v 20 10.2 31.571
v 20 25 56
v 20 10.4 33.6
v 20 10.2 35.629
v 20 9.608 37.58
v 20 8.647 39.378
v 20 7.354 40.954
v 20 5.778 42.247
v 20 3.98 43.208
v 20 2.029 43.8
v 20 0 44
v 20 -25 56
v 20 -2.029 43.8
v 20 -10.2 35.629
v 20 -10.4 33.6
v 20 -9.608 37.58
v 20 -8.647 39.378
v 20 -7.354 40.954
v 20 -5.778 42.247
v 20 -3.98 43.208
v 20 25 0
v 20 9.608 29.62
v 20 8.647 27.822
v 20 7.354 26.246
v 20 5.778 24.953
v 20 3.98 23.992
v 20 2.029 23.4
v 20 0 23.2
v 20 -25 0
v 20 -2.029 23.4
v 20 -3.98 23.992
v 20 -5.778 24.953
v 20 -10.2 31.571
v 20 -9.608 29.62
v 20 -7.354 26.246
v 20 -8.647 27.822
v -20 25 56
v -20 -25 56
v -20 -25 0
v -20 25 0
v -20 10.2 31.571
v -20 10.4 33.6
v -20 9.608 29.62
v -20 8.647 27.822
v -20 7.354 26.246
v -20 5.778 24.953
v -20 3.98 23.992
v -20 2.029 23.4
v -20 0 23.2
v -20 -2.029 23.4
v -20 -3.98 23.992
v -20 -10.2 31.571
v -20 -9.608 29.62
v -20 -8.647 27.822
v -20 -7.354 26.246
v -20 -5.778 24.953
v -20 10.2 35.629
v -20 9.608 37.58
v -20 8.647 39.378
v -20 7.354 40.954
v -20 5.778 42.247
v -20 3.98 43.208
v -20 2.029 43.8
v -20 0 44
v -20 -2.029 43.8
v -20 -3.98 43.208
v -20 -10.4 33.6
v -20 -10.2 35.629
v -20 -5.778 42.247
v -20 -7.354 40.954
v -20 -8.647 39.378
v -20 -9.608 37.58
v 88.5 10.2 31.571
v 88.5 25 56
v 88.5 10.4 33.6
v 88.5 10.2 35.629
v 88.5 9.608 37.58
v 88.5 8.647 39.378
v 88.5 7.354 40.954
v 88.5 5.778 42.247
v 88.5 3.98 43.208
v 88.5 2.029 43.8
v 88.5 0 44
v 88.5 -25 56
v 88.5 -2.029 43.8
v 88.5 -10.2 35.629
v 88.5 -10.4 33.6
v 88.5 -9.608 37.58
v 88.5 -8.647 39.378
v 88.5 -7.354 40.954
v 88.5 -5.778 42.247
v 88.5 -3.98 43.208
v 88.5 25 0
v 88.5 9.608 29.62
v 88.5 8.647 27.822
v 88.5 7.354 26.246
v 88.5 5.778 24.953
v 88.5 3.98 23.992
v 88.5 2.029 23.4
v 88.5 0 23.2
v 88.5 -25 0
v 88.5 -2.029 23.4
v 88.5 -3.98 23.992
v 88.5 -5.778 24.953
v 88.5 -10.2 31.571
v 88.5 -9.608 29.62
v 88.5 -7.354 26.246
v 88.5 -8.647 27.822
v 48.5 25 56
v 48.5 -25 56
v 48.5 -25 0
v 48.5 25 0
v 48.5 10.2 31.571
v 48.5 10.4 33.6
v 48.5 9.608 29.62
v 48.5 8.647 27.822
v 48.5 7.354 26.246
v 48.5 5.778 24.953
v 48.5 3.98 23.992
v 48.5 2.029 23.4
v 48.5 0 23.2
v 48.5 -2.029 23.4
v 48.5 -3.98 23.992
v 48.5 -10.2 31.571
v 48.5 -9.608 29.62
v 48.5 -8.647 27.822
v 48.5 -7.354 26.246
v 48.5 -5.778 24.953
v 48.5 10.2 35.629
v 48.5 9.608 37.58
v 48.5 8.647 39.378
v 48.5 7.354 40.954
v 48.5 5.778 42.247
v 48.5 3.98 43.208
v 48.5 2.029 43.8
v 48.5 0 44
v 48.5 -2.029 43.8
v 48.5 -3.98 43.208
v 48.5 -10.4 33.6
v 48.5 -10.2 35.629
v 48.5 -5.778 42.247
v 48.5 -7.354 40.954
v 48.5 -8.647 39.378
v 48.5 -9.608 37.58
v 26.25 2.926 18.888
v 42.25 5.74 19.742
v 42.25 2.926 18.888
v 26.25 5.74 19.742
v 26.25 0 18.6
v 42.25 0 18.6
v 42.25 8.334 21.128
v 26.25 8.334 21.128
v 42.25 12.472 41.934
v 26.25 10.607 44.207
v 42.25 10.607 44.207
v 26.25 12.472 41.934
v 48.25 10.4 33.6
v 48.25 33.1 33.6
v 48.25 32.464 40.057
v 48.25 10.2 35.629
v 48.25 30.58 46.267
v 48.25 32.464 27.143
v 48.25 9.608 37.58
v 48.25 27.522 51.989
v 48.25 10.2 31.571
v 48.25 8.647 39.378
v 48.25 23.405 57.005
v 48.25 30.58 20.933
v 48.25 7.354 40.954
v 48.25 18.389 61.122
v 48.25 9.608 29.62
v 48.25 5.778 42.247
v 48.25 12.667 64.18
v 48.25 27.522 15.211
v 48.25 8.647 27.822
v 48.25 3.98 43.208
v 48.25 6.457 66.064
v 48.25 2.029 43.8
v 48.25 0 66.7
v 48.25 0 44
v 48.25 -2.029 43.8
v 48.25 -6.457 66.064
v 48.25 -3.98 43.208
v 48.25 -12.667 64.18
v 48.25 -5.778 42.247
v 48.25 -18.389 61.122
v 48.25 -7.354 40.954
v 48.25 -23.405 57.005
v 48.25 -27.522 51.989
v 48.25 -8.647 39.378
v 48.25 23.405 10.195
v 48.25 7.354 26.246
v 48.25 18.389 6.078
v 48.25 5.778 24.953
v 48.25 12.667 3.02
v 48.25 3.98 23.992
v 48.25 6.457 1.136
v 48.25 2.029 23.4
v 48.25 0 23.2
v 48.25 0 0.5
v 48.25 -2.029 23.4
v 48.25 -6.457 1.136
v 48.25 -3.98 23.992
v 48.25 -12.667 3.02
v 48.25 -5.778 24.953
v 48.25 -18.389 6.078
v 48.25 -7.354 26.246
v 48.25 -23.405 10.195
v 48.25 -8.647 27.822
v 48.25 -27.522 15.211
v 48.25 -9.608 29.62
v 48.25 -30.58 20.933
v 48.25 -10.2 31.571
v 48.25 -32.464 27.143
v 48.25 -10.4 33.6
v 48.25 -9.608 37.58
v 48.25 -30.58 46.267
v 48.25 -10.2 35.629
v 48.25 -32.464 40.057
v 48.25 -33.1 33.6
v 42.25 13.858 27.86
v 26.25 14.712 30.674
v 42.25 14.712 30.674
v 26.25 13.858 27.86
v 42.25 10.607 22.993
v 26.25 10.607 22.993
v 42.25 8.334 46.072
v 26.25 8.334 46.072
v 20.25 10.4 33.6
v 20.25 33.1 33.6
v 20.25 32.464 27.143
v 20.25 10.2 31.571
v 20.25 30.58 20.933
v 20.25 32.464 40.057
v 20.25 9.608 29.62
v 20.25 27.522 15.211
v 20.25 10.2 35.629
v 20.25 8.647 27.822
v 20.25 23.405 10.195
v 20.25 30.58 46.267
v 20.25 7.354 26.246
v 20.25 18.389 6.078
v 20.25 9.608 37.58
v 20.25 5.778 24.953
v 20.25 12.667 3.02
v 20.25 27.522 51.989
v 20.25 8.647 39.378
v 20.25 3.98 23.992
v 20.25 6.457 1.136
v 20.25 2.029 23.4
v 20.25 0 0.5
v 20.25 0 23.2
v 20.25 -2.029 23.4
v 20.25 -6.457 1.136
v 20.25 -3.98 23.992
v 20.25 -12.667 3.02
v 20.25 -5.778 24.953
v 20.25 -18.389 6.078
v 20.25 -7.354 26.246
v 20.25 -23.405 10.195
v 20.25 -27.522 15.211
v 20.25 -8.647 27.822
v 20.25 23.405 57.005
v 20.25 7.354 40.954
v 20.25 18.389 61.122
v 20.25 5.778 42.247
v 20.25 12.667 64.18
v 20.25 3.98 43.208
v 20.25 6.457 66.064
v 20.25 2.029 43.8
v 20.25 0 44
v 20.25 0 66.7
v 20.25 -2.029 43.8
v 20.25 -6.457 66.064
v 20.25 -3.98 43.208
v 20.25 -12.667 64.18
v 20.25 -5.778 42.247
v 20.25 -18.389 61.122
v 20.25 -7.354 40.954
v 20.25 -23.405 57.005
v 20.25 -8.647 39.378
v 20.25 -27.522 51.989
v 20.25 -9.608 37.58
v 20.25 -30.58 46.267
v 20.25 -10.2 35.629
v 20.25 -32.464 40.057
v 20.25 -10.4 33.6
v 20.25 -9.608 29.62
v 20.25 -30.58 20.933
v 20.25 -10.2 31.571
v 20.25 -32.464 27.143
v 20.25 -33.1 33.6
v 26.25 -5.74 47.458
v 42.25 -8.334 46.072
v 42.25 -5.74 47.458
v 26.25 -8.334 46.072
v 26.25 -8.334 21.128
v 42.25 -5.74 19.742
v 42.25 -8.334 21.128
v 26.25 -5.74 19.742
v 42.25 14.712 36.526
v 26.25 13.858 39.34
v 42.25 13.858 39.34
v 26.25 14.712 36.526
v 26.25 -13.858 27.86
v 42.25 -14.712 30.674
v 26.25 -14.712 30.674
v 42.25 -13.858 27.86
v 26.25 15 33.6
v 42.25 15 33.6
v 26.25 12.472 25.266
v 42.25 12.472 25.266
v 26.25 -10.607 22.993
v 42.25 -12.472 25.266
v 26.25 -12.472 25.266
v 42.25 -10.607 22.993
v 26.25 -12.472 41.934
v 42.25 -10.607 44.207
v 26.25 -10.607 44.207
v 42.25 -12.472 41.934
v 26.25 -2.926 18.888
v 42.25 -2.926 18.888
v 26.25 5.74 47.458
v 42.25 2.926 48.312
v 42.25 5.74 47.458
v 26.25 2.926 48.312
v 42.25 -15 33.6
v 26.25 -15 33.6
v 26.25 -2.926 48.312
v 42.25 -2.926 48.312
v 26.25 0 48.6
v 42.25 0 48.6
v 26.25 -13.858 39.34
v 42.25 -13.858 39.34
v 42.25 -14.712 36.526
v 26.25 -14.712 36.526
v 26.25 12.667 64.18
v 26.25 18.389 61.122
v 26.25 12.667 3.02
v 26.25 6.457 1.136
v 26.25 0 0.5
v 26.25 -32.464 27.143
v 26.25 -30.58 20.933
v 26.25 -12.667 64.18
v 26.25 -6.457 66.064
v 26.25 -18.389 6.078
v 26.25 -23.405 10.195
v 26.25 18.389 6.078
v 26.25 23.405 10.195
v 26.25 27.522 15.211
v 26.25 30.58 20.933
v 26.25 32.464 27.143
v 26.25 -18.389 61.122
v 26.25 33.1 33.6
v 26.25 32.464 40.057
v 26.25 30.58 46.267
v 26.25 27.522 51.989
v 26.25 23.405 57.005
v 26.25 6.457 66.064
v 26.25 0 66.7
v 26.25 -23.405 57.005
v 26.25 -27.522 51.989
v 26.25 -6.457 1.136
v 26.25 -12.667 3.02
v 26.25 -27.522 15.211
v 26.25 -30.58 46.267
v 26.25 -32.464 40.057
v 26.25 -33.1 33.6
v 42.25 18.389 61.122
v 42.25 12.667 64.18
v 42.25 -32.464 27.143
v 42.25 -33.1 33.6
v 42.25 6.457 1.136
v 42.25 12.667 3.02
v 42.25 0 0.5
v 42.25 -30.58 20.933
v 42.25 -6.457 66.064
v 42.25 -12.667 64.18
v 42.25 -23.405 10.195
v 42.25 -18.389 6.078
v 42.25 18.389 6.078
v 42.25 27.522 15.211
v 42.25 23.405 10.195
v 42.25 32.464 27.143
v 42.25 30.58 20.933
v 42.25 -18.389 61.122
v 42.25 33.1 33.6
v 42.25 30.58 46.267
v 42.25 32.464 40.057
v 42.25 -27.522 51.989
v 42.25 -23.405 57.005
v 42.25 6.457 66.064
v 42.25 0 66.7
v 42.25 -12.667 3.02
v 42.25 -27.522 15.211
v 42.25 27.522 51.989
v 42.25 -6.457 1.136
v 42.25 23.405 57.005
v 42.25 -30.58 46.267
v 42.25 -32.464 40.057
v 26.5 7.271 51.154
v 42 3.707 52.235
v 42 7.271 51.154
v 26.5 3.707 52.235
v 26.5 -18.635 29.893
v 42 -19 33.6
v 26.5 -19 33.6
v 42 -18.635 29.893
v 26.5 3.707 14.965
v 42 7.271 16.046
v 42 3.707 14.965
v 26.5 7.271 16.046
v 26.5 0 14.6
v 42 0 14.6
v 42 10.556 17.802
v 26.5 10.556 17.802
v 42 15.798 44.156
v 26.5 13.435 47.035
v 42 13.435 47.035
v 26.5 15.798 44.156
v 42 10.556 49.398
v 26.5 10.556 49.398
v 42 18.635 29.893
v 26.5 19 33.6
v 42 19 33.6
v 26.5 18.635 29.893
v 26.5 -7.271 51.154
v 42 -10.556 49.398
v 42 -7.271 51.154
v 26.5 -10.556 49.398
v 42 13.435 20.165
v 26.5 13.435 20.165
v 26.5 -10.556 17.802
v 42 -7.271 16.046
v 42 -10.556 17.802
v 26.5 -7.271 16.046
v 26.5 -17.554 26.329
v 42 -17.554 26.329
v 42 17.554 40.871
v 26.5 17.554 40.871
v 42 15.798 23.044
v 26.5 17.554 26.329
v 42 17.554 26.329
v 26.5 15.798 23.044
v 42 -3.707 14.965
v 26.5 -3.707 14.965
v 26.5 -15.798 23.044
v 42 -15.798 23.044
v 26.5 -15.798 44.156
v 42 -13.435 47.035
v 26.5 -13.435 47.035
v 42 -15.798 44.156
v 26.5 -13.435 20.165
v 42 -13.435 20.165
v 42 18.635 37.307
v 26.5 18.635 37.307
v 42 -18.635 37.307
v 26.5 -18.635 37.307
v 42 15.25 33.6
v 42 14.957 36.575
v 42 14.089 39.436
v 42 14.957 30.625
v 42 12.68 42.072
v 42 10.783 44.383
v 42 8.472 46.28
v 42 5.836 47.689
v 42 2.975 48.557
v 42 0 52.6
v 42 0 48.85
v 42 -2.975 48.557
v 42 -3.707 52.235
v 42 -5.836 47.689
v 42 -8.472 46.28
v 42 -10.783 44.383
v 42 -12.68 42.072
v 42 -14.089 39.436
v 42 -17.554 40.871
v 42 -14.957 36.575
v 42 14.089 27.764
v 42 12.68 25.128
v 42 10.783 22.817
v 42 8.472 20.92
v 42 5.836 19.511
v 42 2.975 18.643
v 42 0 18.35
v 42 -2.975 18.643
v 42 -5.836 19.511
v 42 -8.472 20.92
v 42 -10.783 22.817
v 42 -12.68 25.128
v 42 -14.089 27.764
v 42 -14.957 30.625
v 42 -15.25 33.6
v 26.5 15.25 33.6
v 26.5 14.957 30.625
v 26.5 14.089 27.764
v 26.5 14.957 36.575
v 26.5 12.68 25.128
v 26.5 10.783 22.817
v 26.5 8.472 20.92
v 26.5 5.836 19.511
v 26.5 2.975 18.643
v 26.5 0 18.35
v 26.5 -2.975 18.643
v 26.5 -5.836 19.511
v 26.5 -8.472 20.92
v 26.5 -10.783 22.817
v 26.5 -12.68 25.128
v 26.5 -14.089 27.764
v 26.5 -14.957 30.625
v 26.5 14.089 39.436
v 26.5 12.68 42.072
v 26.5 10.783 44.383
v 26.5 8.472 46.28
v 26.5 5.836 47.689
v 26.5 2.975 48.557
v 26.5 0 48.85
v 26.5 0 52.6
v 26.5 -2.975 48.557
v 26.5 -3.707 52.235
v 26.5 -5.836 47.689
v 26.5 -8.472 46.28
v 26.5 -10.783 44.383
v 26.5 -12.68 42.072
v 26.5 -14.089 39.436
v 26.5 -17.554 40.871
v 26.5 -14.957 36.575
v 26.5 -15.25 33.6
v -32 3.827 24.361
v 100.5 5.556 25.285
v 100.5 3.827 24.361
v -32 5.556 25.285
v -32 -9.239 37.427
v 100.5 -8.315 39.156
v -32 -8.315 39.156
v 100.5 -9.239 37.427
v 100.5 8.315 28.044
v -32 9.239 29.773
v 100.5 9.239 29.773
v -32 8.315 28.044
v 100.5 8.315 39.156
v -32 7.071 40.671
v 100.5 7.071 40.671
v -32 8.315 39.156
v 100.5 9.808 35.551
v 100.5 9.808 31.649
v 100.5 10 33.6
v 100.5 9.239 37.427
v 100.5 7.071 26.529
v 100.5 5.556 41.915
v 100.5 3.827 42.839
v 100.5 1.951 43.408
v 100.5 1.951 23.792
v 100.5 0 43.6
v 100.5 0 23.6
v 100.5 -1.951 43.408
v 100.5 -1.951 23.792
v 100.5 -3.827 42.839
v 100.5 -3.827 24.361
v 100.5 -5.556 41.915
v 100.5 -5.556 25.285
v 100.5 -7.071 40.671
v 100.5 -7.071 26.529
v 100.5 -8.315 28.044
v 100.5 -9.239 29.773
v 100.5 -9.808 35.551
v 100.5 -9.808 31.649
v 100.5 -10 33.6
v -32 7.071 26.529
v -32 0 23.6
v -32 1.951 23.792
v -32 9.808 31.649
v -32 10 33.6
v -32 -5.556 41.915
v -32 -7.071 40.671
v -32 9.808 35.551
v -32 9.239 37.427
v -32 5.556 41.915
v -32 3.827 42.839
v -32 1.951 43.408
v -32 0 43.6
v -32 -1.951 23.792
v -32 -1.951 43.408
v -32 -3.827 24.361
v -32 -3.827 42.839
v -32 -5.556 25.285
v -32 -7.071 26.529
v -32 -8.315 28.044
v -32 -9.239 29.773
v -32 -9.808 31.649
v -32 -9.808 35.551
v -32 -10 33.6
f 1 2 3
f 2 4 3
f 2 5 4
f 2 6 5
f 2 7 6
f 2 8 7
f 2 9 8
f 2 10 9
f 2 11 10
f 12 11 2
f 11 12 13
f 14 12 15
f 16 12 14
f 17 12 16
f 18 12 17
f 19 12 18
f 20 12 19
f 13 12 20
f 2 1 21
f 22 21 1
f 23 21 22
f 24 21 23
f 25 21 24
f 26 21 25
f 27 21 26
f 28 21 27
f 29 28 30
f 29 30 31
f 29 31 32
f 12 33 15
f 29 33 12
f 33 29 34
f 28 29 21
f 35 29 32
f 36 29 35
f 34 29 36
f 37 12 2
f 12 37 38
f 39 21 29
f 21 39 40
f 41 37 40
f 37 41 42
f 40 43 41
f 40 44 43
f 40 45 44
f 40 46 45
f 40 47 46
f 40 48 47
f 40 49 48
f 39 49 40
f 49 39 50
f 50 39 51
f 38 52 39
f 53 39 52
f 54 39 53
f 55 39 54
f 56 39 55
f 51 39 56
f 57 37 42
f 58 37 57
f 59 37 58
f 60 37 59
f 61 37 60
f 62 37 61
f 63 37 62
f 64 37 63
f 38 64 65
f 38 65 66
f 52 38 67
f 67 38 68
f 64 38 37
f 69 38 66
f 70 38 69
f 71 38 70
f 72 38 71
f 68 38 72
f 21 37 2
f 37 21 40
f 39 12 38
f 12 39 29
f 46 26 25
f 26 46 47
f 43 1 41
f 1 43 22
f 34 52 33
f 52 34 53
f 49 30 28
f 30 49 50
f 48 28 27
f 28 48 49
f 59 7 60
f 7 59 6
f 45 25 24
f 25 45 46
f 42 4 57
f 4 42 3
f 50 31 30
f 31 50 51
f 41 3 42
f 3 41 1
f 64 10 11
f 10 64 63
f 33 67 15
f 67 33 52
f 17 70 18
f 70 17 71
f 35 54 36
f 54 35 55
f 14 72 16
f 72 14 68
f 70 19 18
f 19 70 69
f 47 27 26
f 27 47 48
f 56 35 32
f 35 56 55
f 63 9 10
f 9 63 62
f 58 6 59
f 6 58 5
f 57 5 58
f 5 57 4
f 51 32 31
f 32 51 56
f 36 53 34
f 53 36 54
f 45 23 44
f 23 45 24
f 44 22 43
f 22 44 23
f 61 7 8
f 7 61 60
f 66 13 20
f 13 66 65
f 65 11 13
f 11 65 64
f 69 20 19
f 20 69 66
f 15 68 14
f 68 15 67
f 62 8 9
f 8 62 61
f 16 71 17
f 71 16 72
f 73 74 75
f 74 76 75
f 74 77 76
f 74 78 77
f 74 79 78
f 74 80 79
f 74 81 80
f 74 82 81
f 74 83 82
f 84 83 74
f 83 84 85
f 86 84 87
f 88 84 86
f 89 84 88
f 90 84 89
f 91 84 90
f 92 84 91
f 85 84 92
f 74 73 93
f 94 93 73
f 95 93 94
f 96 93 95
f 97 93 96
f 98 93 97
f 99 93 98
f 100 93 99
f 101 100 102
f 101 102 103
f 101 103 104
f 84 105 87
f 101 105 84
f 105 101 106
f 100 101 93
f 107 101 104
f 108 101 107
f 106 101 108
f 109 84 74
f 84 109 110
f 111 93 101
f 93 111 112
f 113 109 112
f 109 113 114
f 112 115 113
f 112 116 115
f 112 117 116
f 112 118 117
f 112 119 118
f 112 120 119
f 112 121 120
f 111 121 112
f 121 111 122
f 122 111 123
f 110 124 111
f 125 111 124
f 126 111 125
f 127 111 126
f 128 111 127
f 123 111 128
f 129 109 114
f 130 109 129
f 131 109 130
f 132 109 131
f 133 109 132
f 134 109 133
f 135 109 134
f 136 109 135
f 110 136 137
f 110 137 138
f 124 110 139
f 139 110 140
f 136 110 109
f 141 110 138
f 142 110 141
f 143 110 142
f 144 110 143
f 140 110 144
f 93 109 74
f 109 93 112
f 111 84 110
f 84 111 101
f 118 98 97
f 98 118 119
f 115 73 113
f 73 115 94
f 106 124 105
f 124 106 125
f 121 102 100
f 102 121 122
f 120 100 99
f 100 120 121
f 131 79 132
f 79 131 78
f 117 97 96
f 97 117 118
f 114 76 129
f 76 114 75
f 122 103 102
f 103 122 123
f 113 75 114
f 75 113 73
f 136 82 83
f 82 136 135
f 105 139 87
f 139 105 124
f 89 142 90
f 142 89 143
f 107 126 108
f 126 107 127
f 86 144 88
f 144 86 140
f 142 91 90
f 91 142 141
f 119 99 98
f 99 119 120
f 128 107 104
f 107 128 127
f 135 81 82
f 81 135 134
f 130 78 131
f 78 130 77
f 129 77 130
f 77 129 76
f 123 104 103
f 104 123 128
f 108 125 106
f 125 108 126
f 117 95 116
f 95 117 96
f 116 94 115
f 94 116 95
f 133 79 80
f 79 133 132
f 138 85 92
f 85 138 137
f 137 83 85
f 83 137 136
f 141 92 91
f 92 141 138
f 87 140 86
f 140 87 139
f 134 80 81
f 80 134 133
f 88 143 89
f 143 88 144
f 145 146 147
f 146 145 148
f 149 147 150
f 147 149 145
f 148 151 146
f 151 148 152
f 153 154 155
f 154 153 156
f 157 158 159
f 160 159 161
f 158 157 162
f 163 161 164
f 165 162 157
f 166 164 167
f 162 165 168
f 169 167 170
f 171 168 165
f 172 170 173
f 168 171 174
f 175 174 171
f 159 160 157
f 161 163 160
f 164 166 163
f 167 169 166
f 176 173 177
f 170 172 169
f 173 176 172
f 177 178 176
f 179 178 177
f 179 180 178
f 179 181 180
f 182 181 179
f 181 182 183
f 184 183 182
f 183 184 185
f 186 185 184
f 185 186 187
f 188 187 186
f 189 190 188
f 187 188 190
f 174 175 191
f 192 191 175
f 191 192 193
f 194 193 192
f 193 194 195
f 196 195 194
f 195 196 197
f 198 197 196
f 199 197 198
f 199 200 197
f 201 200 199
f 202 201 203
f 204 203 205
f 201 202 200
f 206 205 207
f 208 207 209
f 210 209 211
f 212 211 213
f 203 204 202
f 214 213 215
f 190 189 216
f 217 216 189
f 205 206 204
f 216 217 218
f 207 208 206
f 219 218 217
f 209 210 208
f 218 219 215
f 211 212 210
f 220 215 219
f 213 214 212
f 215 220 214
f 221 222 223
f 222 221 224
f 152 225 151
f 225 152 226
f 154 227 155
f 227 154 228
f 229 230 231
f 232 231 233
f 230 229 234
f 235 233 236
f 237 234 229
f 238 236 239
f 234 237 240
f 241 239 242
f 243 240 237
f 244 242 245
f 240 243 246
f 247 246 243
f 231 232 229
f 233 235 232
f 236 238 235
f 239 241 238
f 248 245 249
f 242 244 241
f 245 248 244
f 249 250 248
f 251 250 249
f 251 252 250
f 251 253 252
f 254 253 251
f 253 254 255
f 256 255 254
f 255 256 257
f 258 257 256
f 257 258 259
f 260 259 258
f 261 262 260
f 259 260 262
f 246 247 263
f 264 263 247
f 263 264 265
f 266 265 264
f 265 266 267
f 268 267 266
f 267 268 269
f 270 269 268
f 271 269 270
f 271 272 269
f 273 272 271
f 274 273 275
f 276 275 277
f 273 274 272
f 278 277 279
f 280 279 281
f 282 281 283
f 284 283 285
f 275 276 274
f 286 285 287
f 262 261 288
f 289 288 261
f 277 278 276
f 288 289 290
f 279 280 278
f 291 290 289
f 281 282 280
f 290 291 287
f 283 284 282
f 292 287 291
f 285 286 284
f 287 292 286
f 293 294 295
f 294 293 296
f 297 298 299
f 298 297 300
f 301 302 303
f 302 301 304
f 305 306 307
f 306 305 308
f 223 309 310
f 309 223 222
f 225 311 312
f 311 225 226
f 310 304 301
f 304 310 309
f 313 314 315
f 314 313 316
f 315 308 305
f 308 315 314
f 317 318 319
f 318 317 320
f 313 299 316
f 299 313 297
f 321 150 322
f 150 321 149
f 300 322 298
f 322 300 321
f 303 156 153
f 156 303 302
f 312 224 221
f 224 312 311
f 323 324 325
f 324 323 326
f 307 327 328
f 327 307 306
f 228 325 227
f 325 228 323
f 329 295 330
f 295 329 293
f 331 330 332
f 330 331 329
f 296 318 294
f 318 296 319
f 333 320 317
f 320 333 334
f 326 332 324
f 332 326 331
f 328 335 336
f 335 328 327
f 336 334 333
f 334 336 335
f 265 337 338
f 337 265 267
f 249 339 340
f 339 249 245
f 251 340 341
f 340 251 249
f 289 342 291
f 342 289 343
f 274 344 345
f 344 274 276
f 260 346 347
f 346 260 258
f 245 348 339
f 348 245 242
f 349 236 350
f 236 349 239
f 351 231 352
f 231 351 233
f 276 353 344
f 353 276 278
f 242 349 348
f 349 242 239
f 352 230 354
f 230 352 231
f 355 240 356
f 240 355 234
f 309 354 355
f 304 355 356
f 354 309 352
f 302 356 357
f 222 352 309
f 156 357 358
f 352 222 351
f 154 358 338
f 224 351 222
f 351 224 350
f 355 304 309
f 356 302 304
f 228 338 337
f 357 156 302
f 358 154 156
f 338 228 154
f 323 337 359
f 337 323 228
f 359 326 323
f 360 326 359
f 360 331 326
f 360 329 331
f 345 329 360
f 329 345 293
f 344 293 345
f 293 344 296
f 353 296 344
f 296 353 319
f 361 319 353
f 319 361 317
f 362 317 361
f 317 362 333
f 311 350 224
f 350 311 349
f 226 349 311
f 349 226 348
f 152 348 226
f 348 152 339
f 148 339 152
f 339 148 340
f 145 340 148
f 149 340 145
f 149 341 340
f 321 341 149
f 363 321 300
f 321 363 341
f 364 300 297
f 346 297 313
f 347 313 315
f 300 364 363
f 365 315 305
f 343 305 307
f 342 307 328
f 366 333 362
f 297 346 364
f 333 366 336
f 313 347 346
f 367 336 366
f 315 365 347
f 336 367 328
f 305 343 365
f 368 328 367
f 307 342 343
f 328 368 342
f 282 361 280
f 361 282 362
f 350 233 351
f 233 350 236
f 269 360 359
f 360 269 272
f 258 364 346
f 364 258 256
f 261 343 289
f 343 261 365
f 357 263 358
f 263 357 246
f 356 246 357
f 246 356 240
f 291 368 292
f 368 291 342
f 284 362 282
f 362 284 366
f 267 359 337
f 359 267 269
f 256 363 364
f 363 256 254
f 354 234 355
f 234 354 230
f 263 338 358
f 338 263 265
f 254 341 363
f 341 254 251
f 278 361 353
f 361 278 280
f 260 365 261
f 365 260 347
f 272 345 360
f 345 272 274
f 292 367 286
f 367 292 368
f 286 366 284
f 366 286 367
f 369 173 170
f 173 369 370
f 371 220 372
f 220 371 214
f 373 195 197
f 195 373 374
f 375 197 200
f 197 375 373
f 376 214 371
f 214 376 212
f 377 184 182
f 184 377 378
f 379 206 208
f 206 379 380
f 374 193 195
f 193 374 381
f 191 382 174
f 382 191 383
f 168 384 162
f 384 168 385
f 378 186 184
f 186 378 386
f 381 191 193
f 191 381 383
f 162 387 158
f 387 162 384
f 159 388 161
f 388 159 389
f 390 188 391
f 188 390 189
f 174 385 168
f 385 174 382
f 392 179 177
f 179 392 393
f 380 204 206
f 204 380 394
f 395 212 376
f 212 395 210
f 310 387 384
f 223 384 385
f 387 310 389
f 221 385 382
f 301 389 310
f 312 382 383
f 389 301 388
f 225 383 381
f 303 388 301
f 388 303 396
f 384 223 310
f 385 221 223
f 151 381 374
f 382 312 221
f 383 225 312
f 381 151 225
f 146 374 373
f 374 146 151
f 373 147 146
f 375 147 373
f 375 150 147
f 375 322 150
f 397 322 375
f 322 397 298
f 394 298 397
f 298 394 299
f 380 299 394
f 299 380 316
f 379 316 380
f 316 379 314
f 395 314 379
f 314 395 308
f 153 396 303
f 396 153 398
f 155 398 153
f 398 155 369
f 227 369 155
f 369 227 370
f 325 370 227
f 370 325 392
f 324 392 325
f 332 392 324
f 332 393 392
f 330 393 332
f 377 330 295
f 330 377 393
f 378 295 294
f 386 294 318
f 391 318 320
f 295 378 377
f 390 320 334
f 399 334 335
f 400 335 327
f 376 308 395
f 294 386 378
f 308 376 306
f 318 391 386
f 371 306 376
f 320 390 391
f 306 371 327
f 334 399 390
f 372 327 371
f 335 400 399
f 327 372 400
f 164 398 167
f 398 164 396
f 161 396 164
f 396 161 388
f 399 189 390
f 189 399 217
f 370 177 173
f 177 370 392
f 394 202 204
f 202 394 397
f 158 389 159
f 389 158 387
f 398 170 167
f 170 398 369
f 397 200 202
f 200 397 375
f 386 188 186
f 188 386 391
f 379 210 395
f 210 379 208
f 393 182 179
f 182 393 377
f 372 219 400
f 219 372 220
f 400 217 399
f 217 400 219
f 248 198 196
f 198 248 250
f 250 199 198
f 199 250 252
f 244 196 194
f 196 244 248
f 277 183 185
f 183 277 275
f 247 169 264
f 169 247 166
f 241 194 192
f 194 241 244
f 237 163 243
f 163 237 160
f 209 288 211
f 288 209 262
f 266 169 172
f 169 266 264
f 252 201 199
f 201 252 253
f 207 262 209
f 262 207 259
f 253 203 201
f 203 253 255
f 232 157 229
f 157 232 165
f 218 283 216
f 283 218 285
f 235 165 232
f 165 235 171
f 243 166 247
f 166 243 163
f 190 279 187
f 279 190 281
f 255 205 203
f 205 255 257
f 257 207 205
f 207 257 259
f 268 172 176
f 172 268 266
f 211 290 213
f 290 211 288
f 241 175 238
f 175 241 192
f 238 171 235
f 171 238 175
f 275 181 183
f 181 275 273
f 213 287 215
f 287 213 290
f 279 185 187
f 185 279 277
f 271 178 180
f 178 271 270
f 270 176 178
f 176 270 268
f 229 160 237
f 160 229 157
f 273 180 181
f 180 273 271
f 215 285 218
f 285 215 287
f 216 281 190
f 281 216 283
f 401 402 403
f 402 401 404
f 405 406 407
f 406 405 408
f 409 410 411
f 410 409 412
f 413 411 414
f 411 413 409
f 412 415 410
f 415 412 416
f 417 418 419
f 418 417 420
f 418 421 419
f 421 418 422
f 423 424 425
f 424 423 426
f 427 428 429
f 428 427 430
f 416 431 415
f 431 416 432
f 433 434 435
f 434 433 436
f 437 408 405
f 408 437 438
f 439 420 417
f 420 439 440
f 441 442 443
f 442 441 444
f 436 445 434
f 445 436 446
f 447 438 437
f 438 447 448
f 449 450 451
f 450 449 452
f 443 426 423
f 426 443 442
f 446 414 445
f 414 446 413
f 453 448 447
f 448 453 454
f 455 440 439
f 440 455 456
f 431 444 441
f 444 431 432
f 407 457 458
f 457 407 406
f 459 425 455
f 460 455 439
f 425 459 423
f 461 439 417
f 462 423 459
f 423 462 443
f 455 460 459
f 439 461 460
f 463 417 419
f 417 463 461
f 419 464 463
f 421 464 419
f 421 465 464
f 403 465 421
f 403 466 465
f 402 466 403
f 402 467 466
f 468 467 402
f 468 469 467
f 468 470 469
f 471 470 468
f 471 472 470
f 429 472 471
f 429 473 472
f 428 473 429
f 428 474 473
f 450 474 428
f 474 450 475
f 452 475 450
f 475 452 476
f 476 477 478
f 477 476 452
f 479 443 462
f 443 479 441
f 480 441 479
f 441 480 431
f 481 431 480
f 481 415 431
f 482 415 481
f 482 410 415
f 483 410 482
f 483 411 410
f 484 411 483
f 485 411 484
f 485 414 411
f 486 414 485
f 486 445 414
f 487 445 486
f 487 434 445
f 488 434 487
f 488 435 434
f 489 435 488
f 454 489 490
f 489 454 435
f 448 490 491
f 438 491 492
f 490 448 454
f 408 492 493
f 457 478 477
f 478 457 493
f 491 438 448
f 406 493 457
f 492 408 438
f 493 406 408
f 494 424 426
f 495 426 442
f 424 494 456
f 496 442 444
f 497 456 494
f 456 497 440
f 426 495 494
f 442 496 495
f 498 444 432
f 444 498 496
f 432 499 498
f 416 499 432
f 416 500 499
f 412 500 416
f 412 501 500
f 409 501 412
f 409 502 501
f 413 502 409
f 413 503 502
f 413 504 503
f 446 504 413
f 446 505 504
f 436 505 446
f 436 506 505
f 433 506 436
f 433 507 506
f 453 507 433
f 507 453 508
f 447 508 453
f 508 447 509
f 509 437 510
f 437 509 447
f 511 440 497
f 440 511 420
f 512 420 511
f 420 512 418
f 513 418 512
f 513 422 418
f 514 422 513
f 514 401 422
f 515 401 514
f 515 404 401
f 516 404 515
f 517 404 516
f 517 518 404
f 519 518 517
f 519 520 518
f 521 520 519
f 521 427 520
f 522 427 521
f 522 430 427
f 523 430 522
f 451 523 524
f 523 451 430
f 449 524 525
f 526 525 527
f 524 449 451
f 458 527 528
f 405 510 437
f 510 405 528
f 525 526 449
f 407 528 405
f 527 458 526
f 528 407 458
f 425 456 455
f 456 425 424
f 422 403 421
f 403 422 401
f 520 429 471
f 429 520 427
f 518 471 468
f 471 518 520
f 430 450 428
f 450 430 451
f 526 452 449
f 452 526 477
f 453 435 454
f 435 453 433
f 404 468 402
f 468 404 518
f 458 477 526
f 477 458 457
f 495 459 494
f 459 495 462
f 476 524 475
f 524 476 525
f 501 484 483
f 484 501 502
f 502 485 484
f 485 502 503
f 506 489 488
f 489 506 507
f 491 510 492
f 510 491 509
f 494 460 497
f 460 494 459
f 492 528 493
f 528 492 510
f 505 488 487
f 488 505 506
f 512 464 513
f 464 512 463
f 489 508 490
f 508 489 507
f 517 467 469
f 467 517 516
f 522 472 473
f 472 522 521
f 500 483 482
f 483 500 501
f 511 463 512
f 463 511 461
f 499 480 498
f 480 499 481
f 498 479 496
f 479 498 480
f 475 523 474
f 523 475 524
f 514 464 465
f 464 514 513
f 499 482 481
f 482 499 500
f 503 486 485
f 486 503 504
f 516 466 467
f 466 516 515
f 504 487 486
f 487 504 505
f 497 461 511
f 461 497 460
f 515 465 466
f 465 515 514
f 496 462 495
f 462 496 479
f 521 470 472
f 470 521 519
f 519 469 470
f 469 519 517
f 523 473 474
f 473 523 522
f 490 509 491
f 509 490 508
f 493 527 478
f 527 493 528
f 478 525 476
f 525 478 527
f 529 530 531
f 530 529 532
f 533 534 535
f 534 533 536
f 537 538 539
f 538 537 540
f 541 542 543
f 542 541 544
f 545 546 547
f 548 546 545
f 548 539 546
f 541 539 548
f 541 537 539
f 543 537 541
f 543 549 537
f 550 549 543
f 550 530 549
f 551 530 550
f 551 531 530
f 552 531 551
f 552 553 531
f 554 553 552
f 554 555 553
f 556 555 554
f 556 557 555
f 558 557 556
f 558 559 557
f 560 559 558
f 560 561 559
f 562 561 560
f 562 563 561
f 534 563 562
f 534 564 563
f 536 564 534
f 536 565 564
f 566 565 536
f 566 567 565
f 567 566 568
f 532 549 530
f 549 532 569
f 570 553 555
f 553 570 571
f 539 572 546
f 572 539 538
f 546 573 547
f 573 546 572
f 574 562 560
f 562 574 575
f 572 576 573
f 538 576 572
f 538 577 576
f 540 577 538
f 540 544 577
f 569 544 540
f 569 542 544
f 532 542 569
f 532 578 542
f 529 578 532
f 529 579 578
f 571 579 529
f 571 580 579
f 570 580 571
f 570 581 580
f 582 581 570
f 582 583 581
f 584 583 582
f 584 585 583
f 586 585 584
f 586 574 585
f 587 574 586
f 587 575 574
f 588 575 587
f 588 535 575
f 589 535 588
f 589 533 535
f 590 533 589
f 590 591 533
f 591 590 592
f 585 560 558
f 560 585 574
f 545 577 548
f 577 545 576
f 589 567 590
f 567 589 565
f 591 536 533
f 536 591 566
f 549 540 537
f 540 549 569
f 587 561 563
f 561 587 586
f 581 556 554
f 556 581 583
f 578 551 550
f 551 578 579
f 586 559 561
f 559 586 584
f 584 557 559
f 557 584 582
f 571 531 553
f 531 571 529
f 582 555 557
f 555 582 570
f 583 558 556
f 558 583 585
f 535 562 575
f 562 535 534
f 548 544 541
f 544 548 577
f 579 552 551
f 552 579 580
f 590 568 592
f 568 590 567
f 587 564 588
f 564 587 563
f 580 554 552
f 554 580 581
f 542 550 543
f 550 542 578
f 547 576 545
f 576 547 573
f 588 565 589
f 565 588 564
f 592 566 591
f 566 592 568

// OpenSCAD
$fn = 32;

// ------------------------------------------------------------------------
// Pulley assembly: d66.2 pulley with a belt, shaft d20
// Every part is its own module, assembly() places them once.
// ------------------------------------------------------------------------

// --- part 1 ---
module support1() {
  difference() {
    translate([-20, -25, 0]) cube([40, 50, 56]);
    translate([0, 0, 33.6]) rotate([0, 90, 0]) cylinder(h = 42, d = 20.8, center = true);
  }
}

// --- part 2 ---
module support2() {
  difference() {
    translate([-20, -25, 0]) cube([40, 50, 56]);
    translate([0, 0, 33.6]) rotate([0, 90, 0]) cylinder(h = 42, d = 20.8, center = true);
  }
}

// --- part 3 ---
module shaft() {
  translate([0, 0, -66.25]) cylinder(h = 132.5, d = 20);
}

// --- part 4 ---
module pulley() {
  difference() {
    union() {
      cylinder(h = 28, d = 30);
      cylinder(h = 6, d = 66.2);
      translate([0, 0, 22]) cylinder(h = 6, d = 66.2);
    }
    translate([0, 0, -1]) cylinder(h = 30, d = 20.8);
  }
}

// --- part 5 ---
module belt() {
  difference() {
      translate([0, 0, 0]) cylinder(h = 15.5, d = 38);
      translate([0, 0, -1]) cylinder(h = 17.5, d = 30.5);
    }
}

// --- assembly ---
module assembly() {
  translate([0, 0, 0]) rotate([0, 0, 0]) support1();
  translate([68.5, 0, 0]) rotate([0, 0, 0]) support2();
  translate([34.25, 0, 33.6]) rotate([0, 90, 0]) shaft();
  translate([20.25, 0, 33.6]) rotate([0, 90, 0]) pulley();
  translate([26.5, 0, 33.6]) rotate([0, 90, 0]) belt();
}

assembly();
